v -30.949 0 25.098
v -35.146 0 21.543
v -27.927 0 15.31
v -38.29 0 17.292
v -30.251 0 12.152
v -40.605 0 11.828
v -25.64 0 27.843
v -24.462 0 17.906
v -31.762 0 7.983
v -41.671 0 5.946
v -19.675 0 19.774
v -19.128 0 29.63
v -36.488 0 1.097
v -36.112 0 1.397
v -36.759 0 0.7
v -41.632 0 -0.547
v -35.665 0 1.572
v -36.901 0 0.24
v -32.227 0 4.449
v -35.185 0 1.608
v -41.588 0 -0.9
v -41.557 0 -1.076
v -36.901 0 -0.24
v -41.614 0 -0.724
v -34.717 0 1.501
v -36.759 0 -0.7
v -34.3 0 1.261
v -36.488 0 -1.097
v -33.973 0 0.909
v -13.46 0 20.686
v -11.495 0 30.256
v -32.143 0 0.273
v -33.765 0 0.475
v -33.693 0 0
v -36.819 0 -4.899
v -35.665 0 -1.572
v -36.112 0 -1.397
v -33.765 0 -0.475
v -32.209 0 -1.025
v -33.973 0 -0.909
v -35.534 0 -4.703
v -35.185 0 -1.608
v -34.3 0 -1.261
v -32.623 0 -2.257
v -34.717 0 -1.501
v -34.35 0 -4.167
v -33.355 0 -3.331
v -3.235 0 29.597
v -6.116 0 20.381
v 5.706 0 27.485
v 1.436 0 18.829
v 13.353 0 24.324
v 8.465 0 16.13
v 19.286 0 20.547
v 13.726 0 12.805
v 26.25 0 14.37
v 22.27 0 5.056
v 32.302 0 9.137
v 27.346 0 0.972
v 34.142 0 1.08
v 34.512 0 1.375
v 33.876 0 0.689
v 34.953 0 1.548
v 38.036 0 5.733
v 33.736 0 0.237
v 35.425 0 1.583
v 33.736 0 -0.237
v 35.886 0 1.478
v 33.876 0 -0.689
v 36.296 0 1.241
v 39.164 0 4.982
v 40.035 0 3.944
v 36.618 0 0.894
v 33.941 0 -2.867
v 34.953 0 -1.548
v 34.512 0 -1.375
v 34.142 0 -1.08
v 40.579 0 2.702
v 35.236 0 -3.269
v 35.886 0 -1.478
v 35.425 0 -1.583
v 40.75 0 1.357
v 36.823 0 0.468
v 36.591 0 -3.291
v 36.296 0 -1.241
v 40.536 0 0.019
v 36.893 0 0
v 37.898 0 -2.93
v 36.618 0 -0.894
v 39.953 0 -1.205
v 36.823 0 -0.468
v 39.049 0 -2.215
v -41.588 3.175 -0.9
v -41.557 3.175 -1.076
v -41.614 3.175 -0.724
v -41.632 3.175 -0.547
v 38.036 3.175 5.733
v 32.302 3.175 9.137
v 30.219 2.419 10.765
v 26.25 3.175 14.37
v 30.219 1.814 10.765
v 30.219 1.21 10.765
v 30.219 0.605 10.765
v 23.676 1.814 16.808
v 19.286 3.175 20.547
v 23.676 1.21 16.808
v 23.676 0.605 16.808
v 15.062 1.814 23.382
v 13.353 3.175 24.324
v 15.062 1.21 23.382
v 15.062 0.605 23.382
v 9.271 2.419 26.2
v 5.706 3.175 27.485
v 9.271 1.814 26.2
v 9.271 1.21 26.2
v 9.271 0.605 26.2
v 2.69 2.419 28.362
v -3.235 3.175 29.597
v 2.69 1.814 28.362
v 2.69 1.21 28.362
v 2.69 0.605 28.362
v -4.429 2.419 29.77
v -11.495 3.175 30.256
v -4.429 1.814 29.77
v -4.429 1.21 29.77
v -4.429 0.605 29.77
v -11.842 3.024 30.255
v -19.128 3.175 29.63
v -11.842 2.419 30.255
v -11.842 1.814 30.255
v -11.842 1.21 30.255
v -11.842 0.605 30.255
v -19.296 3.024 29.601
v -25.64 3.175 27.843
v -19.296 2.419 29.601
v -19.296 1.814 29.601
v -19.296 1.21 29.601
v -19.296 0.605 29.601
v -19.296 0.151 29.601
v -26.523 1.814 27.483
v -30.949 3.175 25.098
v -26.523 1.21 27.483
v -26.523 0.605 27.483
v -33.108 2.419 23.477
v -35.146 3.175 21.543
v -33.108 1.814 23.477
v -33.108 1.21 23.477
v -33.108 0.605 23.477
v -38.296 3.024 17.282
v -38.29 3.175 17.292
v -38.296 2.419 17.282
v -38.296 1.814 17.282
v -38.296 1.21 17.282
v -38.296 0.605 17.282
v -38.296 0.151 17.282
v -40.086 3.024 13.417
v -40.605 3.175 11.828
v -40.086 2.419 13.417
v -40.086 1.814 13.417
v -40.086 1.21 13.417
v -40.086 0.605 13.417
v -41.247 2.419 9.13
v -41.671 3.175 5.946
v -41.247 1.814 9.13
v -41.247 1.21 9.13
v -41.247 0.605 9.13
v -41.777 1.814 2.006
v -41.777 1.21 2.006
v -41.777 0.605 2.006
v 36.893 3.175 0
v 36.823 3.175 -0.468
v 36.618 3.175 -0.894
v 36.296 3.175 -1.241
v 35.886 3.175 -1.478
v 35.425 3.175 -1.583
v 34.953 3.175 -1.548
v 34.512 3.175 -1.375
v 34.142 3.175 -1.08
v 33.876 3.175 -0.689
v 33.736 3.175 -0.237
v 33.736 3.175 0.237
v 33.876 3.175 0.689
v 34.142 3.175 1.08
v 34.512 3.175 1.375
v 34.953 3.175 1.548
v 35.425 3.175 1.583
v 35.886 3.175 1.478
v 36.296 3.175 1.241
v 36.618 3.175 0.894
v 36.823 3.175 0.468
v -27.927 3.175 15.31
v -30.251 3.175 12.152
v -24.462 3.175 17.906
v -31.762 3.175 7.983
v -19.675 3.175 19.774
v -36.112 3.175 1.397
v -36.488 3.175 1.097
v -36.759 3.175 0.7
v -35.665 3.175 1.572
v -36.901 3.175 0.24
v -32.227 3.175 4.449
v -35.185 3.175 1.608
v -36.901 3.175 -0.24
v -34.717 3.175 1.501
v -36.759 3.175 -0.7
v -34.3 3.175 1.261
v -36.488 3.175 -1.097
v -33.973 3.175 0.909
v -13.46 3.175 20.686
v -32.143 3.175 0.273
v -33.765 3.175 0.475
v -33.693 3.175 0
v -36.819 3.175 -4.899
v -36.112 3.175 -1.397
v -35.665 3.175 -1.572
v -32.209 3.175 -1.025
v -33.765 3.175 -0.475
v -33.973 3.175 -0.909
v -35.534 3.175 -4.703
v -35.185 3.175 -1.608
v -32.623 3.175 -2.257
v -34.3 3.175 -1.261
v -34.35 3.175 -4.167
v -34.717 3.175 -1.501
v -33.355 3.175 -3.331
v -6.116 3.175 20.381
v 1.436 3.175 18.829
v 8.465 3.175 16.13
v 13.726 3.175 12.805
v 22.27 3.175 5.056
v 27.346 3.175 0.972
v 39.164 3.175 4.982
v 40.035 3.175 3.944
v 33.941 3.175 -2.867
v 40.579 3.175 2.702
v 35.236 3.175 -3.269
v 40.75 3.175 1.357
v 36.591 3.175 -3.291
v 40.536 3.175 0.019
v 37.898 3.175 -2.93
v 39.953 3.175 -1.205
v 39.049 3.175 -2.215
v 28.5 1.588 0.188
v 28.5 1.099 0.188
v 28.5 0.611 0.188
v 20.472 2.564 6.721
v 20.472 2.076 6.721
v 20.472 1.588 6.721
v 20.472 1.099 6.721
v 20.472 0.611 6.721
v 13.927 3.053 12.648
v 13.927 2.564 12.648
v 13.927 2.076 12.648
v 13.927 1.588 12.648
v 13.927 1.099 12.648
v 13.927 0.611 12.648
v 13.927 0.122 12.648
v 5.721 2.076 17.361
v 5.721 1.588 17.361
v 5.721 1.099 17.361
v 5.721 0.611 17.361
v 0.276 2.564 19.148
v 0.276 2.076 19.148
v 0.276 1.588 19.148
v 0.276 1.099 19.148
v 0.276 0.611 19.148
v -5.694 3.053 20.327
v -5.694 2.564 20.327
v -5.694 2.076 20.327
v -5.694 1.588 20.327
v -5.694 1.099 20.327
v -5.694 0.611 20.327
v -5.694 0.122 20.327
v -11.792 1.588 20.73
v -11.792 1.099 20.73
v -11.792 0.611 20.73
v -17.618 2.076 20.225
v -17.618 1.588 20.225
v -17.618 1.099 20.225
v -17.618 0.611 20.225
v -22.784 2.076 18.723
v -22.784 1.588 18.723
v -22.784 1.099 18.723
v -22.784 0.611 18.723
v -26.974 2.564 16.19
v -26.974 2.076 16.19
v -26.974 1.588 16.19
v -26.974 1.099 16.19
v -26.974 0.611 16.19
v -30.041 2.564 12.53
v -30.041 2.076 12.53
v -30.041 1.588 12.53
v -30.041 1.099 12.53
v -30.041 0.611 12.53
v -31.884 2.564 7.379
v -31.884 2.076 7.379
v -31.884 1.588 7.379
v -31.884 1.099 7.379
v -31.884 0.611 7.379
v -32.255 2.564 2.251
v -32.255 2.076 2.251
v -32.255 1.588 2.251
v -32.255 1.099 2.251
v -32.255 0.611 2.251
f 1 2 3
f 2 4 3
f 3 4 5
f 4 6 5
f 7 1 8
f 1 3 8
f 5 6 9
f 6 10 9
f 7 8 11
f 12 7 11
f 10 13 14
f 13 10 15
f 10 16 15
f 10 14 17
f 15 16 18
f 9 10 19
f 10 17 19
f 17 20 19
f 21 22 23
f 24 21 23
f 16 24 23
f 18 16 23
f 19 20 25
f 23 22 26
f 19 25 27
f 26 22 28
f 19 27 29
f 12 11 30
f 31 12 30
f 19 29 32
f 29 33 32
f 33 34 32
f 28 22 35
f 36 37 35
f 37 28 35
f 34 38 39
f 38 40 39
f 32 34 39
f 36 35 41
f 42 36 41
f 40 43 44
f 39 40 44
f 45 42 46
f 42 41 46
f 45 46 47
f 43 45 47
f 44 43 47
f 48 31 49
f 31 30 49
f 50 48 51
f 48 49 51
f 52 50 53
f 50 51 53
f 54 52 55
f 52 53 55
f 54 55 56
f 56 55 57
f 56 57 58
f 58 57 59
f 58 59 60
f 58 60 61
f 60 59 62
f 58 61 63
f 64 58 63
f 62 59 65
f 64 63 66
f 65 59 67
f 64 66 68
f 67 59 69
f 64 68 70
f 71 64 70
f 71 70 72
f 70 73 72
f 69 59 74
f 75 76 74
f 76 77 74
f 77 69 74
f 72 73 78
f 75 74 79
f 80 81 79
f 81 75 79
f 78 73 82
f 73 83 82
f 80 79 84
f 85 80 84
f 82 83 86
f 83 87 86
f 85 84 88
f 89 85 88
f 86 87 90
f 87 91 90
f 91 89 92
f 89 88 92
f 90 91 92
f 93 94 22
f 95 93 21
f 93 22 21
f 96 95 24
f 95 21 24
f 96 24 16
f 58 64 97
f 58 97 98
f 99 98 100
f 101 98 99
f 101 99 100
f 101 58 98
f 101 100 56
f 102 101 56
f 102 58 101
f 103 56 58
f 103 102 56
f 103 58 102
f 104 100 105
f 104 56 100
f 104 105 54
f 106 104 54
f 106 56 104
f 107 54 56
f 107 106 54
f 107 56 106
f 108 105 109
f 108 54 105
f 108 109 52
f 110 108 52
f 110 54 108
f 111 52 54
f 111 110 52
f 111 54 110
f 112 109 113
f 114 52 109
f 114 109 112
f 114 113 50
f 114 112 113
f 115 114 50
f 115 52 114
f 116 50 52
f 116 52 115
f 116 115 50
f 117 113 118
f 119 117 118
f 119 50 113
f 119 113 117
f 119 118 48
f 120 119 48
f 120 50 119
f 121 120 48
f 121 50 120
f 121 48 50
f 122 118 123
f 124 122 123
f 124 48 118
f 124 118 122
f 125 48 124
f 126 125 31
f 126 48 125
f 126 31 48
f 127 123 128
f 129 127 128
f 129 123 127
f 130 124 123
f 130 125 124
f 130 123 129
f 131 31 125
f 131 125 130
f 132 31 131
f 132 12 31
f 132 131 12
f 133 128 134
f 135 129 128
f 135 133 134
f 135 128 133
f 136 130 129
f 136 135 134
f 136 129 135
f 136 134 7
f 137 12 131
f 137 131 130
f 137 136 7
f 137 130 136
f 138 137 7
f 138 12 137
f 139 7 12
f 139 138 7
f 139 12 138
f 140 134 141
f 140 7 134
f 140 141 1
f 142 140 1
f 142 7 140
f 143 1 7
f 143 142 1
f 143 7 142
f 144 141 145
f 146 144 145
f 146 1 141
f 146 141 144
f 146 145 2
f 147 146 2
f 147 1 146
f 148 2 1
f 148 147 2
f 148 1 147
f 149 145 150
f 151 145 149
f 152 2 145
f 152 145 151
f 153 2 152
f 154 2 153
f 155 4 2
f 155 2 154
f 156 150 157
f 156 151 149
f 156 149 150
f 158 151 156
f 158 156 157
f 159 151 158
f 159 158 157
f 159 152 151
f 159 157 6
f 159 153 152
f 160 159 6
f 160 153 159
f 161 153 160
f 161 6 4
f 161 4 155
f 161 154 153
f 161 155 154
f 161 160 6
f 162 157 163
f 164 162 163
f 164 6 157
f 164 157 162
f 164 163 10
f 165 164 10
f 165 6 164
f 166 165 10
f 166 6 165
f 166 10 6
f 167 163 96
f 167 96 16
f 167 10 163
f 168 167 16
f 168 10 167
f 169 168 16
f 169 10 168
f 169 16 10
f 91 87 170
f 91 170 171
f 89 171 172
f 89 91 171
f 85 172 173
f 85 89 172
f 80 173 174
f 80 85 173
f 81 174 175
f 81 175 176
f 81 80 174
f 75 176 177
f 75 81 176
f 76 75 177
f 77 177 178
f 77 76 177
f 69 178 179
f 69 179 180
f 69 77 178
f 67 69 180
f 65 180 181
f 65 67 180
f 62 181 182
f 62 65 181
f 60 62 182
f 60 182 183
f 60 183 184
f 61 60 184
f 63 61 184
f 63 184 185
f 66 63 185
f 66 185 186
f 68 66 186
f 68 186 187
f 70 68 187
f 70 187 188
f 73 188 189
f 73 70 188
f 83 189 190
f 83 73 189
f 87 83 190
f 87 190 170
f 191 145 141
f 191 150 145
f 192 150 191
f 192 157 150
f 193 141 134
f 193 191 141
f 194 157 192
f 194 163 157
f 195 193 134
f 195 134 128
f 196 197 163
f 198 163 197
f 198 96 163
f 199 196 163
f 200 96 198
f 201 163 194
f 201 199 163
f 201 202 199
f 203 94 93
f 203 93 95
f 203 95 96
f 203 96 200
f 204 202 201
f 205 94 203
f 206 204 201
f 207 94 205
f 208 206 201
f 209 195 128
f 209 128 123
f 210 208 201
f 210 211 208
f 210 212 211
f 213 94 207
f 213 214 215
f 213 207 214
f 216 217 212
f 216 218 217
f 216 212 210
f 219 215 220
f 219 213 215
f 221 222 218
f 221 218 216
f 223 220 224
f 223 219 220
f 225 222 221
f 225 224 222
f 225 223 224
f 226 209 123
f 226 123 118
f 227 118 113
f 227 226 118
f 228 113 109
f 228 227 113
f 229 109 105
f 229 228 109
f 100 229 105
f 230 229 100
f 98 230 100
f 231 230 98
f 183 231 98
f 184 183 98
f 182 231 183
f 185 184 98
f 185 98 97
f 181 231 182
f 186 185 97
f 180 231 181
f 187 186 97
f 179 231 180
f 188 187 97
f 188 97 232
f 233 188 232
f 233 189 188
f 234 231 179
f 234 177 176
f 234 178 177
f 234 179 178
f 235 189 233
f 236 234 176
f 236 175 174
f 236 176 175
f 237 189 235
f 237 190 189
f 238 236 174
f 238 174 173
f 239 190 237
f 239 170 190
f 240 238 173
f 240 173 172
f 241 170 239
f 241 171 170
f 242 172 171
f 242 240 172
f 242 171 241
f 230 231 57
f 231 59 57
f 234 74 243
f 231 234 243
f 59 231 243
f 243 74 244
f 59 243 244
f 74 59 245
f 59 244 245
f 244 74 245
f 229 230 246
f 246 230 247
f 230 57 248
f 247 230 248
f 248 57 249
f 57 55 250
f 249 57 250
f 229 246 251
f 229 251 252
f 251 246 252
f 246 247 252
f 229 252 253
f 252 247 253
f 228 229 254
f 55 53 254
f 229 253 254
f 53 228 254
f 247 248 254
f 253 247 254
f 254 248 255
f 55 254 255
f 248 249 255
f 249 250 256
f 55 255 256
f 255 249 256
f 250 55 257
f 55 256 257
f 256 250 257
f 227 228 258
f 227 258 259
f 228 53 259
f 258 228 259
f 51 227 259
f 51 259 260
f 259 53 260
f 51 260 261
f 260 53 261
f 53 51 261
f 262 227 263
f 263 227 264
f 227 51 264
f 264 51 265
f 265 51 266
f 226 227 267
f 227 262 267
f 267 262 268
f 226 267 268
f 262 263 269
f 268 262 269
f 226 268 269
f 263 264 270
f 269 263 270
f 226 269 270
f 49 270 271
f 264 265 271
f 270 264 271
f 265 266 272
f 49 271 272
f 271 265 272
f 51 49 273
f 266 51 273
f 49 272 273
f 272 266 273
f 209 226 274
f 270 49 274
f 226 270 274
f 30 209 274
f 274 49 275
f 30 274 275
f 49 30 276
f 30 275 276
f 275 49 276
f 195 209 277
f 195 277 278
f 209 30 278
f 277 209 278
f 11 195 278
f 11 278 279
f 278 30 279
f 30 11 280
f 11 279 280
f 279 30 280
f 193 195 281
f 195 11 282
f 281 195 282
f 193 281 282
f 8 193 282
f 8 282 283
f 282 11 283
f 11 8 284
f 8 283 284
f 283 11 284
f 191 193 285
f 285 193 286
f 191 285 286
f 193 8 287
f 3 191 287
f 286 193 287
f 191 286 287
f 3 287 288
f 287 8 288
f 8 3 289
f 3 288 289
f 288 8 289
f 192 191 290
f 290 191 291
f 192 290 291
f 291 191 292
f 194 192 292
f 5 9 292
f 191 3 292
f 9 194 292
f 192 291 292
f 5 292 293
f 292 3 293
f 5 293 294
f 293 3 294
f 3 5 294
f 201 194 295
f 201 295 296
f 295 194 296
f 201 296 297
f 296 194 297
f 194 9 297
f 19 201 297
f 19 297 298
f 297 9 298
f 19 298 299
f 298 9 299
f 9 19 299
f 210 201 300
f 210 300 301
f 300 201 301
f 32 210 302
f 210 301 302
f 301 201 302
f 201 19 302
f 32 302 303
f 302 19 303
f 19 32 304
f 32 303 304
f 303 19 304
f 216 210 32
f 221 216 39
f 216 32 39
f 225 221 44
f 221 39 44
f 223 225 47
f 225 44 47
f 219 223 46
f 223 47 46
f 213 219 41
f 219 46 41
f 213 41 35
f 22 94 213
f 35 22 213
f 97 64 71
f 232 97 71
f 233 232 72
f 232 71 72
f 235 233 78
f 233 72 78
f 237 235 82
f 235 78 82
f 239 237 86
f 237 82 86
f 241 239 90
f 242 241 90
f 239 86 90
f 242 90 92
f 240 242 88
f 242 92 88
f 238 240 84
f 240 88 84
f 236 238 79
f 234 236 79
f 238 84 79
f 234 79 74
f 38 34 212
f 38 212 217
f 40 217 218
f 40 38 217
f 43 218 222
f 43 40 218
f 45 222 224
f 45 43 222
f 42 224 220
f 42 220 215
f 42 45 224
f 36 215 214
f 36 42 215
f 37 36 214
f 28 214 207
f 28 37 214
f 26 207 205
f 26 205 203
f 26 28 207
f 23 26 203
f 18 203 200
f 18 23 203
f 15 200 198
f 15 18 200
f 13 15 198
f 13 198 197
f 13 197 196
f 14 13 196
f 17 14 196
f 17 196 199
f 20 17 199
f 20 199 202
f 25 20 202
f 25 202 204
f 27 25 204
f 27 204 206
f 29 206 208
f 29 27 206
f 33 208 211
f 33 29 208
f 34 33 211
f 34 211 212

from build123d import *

# Parameters (mm, degrees)
SKETCH1_R           = 1.6129
SKETCH1_R_2         = 1.5875
BOSS_EXTRUDE1_DEPTH = 3.175
CUT_EXTRUDE1_REACH  = 5.175


with BuildPart() as part:
    # Sketch1 → Boss-Extrude1 (new body)
    with BuildSketch(Plane(origin=(0, 0, 0), x_dir=(1, 0, 0), z_dir=(0, 1, 0))):
        with BuildLine():
            ThreePointArc((-32.142793863, -0.273408004), (-36.477491062, 4.881513207), (-41.632412273, 0.546816008))
            add(Edge.make_bspline(
                [(38.035586667, -5.733398349), (37.638456287, -5.922466284), (36.836942575, -6.321273918), (35.371138332, -7.116261195), (33.693170464, -8.143185315), (31.883886812, -9.42020902), (29.648378201, -11.198676514), (27.036028795, -13.592789636), (22.679976617, -17.831524884), (17.211739573, -22.499159659), (9.396423134, -26.315794857), (0.576595974, -29.205533013), (-9.337135311, -30.642162686), (-19.330270602, -29.840555436), (-26.618230144, -27.80035627), (-32.213942131, -24.514308128), (-36.014693252, -20.74489615), (-38.392774611, -17.364575843), (-40.192531501, -13.487083667), (-41.355396656, -9.192066449), (-41.782608077, -5.300476187), (-41.804321571, -2.028547037), (-41.705805772, -0.302313361), (-41.632412273, 0.546816008)],
                knots=[0, 0, 0, 0, 0.015625, 0.03125, 0.0625, 0.09375, 0.125, 0.1875, 0.25, 0.375, 0.4375, 0.5, 0.625, 0.6875, 0.75, 0.8125, 0.84375, 0.875, 0.90625, 0.9375, 0.96875, 0.984375, 1, 1, 1, 1], degree=3))
            ThreePointArc((38.035586667, -5.733398349), (40.288445428, 0.613840413), (33.941206667, 2.866699175))
            add(Edge.make_bspline(
                [(33.941206667, 2.866699175), (33.444862745, 2.63039713), (32.446678251, 2.133753144), (30.593455222, 1.129003811), (28.454502342, -0.17993207), (26.158764415, -1.801029891), (23.397639254, -4.000211026), (20.408833118, -6.751200435), (17.199476649, -9.871715537), (13.993340911, -12.700434126), (10.991950499, -14.796301145), (8.166682163, -16.313492063), (4.956712956, -17.733599771), (0.363730133, -19.250343795), (-5.672765293, -20.456505214), (-11.837126413, -20.883216065), (-17.729783319, -20.392870826), (-22.95250941, -18.893094147), (-26.462588517, -16.790688539), (-28.698373992, -14.567923675), (-30.090943107, -12.59116295), (-31.186712287, -10.245348167), (-31.822530926, -7.925351865), (-32.135142613, -5.82120044), (-32.263078141, -4.114852993), (-32.273485933, -2.578959429), (-32.220503872, -1.288018796), (-32.171746437, -0.608376098), (-32.142793863, -0.273408004)],
                knots=[0, 0, 0, 0, 0.015625, 0.03125, 0.0625, 0.09375, 0.125, 0.1875, 0.25, 0.3125, 0.375, 0.40625, 0.4375, 0.5, 0.5625, 0.625, 0.6875, 0.75, 0.8125, 0.84375, 0.875, 0.90625, 0.9375, 0.953125, 0.96875, 0.984375, 0.9921875, 1, 1, 1, 1], degree=3))
        make_face()
        with Locations((-35.306, 0)):
            Circle(SKETCH1_R, mode=Mode.SUBTRACT)
        with Locations((35.306, 0)):
            Circle(SKETCH1_R_2, mode=Mode.SUBTRACT)
    extrude(amount=BOSS_EXTRUDE1_DEPTH)

    # Sketch3 → Cut-Extrude1 (cut, up to next)
    with BuildSketch(Plane(origin=(0, 3.175, 0), x_dir=(1, 0, 0), z_dir=(0, 1, 0)), mode=Mode.PRIVATE) as cut_extrude1_sk1:
        with BuildLine():
            Line((-41.556602668, 1.07577215), (-36.819106421, 4.8987114))
            ThreePointArc((-36.819106421, 4.8987114), (-39.878401119, 3.842986947), (-41.556602668, 1.07577215))
        make_face()
    cut_extrude1_tool1 = extrude(cut_extrude1_sk1.sketch, amount=-CUT_EXTRUDE1_REACH, mode=Mode.PRIVATE) & part.part
    add(cut_extrude1_tool1.solids().sort_by_distance((-39.467003, 3.175, -3.33317))[0], mode=Mode.SUBTRACT)


solid = part.part
